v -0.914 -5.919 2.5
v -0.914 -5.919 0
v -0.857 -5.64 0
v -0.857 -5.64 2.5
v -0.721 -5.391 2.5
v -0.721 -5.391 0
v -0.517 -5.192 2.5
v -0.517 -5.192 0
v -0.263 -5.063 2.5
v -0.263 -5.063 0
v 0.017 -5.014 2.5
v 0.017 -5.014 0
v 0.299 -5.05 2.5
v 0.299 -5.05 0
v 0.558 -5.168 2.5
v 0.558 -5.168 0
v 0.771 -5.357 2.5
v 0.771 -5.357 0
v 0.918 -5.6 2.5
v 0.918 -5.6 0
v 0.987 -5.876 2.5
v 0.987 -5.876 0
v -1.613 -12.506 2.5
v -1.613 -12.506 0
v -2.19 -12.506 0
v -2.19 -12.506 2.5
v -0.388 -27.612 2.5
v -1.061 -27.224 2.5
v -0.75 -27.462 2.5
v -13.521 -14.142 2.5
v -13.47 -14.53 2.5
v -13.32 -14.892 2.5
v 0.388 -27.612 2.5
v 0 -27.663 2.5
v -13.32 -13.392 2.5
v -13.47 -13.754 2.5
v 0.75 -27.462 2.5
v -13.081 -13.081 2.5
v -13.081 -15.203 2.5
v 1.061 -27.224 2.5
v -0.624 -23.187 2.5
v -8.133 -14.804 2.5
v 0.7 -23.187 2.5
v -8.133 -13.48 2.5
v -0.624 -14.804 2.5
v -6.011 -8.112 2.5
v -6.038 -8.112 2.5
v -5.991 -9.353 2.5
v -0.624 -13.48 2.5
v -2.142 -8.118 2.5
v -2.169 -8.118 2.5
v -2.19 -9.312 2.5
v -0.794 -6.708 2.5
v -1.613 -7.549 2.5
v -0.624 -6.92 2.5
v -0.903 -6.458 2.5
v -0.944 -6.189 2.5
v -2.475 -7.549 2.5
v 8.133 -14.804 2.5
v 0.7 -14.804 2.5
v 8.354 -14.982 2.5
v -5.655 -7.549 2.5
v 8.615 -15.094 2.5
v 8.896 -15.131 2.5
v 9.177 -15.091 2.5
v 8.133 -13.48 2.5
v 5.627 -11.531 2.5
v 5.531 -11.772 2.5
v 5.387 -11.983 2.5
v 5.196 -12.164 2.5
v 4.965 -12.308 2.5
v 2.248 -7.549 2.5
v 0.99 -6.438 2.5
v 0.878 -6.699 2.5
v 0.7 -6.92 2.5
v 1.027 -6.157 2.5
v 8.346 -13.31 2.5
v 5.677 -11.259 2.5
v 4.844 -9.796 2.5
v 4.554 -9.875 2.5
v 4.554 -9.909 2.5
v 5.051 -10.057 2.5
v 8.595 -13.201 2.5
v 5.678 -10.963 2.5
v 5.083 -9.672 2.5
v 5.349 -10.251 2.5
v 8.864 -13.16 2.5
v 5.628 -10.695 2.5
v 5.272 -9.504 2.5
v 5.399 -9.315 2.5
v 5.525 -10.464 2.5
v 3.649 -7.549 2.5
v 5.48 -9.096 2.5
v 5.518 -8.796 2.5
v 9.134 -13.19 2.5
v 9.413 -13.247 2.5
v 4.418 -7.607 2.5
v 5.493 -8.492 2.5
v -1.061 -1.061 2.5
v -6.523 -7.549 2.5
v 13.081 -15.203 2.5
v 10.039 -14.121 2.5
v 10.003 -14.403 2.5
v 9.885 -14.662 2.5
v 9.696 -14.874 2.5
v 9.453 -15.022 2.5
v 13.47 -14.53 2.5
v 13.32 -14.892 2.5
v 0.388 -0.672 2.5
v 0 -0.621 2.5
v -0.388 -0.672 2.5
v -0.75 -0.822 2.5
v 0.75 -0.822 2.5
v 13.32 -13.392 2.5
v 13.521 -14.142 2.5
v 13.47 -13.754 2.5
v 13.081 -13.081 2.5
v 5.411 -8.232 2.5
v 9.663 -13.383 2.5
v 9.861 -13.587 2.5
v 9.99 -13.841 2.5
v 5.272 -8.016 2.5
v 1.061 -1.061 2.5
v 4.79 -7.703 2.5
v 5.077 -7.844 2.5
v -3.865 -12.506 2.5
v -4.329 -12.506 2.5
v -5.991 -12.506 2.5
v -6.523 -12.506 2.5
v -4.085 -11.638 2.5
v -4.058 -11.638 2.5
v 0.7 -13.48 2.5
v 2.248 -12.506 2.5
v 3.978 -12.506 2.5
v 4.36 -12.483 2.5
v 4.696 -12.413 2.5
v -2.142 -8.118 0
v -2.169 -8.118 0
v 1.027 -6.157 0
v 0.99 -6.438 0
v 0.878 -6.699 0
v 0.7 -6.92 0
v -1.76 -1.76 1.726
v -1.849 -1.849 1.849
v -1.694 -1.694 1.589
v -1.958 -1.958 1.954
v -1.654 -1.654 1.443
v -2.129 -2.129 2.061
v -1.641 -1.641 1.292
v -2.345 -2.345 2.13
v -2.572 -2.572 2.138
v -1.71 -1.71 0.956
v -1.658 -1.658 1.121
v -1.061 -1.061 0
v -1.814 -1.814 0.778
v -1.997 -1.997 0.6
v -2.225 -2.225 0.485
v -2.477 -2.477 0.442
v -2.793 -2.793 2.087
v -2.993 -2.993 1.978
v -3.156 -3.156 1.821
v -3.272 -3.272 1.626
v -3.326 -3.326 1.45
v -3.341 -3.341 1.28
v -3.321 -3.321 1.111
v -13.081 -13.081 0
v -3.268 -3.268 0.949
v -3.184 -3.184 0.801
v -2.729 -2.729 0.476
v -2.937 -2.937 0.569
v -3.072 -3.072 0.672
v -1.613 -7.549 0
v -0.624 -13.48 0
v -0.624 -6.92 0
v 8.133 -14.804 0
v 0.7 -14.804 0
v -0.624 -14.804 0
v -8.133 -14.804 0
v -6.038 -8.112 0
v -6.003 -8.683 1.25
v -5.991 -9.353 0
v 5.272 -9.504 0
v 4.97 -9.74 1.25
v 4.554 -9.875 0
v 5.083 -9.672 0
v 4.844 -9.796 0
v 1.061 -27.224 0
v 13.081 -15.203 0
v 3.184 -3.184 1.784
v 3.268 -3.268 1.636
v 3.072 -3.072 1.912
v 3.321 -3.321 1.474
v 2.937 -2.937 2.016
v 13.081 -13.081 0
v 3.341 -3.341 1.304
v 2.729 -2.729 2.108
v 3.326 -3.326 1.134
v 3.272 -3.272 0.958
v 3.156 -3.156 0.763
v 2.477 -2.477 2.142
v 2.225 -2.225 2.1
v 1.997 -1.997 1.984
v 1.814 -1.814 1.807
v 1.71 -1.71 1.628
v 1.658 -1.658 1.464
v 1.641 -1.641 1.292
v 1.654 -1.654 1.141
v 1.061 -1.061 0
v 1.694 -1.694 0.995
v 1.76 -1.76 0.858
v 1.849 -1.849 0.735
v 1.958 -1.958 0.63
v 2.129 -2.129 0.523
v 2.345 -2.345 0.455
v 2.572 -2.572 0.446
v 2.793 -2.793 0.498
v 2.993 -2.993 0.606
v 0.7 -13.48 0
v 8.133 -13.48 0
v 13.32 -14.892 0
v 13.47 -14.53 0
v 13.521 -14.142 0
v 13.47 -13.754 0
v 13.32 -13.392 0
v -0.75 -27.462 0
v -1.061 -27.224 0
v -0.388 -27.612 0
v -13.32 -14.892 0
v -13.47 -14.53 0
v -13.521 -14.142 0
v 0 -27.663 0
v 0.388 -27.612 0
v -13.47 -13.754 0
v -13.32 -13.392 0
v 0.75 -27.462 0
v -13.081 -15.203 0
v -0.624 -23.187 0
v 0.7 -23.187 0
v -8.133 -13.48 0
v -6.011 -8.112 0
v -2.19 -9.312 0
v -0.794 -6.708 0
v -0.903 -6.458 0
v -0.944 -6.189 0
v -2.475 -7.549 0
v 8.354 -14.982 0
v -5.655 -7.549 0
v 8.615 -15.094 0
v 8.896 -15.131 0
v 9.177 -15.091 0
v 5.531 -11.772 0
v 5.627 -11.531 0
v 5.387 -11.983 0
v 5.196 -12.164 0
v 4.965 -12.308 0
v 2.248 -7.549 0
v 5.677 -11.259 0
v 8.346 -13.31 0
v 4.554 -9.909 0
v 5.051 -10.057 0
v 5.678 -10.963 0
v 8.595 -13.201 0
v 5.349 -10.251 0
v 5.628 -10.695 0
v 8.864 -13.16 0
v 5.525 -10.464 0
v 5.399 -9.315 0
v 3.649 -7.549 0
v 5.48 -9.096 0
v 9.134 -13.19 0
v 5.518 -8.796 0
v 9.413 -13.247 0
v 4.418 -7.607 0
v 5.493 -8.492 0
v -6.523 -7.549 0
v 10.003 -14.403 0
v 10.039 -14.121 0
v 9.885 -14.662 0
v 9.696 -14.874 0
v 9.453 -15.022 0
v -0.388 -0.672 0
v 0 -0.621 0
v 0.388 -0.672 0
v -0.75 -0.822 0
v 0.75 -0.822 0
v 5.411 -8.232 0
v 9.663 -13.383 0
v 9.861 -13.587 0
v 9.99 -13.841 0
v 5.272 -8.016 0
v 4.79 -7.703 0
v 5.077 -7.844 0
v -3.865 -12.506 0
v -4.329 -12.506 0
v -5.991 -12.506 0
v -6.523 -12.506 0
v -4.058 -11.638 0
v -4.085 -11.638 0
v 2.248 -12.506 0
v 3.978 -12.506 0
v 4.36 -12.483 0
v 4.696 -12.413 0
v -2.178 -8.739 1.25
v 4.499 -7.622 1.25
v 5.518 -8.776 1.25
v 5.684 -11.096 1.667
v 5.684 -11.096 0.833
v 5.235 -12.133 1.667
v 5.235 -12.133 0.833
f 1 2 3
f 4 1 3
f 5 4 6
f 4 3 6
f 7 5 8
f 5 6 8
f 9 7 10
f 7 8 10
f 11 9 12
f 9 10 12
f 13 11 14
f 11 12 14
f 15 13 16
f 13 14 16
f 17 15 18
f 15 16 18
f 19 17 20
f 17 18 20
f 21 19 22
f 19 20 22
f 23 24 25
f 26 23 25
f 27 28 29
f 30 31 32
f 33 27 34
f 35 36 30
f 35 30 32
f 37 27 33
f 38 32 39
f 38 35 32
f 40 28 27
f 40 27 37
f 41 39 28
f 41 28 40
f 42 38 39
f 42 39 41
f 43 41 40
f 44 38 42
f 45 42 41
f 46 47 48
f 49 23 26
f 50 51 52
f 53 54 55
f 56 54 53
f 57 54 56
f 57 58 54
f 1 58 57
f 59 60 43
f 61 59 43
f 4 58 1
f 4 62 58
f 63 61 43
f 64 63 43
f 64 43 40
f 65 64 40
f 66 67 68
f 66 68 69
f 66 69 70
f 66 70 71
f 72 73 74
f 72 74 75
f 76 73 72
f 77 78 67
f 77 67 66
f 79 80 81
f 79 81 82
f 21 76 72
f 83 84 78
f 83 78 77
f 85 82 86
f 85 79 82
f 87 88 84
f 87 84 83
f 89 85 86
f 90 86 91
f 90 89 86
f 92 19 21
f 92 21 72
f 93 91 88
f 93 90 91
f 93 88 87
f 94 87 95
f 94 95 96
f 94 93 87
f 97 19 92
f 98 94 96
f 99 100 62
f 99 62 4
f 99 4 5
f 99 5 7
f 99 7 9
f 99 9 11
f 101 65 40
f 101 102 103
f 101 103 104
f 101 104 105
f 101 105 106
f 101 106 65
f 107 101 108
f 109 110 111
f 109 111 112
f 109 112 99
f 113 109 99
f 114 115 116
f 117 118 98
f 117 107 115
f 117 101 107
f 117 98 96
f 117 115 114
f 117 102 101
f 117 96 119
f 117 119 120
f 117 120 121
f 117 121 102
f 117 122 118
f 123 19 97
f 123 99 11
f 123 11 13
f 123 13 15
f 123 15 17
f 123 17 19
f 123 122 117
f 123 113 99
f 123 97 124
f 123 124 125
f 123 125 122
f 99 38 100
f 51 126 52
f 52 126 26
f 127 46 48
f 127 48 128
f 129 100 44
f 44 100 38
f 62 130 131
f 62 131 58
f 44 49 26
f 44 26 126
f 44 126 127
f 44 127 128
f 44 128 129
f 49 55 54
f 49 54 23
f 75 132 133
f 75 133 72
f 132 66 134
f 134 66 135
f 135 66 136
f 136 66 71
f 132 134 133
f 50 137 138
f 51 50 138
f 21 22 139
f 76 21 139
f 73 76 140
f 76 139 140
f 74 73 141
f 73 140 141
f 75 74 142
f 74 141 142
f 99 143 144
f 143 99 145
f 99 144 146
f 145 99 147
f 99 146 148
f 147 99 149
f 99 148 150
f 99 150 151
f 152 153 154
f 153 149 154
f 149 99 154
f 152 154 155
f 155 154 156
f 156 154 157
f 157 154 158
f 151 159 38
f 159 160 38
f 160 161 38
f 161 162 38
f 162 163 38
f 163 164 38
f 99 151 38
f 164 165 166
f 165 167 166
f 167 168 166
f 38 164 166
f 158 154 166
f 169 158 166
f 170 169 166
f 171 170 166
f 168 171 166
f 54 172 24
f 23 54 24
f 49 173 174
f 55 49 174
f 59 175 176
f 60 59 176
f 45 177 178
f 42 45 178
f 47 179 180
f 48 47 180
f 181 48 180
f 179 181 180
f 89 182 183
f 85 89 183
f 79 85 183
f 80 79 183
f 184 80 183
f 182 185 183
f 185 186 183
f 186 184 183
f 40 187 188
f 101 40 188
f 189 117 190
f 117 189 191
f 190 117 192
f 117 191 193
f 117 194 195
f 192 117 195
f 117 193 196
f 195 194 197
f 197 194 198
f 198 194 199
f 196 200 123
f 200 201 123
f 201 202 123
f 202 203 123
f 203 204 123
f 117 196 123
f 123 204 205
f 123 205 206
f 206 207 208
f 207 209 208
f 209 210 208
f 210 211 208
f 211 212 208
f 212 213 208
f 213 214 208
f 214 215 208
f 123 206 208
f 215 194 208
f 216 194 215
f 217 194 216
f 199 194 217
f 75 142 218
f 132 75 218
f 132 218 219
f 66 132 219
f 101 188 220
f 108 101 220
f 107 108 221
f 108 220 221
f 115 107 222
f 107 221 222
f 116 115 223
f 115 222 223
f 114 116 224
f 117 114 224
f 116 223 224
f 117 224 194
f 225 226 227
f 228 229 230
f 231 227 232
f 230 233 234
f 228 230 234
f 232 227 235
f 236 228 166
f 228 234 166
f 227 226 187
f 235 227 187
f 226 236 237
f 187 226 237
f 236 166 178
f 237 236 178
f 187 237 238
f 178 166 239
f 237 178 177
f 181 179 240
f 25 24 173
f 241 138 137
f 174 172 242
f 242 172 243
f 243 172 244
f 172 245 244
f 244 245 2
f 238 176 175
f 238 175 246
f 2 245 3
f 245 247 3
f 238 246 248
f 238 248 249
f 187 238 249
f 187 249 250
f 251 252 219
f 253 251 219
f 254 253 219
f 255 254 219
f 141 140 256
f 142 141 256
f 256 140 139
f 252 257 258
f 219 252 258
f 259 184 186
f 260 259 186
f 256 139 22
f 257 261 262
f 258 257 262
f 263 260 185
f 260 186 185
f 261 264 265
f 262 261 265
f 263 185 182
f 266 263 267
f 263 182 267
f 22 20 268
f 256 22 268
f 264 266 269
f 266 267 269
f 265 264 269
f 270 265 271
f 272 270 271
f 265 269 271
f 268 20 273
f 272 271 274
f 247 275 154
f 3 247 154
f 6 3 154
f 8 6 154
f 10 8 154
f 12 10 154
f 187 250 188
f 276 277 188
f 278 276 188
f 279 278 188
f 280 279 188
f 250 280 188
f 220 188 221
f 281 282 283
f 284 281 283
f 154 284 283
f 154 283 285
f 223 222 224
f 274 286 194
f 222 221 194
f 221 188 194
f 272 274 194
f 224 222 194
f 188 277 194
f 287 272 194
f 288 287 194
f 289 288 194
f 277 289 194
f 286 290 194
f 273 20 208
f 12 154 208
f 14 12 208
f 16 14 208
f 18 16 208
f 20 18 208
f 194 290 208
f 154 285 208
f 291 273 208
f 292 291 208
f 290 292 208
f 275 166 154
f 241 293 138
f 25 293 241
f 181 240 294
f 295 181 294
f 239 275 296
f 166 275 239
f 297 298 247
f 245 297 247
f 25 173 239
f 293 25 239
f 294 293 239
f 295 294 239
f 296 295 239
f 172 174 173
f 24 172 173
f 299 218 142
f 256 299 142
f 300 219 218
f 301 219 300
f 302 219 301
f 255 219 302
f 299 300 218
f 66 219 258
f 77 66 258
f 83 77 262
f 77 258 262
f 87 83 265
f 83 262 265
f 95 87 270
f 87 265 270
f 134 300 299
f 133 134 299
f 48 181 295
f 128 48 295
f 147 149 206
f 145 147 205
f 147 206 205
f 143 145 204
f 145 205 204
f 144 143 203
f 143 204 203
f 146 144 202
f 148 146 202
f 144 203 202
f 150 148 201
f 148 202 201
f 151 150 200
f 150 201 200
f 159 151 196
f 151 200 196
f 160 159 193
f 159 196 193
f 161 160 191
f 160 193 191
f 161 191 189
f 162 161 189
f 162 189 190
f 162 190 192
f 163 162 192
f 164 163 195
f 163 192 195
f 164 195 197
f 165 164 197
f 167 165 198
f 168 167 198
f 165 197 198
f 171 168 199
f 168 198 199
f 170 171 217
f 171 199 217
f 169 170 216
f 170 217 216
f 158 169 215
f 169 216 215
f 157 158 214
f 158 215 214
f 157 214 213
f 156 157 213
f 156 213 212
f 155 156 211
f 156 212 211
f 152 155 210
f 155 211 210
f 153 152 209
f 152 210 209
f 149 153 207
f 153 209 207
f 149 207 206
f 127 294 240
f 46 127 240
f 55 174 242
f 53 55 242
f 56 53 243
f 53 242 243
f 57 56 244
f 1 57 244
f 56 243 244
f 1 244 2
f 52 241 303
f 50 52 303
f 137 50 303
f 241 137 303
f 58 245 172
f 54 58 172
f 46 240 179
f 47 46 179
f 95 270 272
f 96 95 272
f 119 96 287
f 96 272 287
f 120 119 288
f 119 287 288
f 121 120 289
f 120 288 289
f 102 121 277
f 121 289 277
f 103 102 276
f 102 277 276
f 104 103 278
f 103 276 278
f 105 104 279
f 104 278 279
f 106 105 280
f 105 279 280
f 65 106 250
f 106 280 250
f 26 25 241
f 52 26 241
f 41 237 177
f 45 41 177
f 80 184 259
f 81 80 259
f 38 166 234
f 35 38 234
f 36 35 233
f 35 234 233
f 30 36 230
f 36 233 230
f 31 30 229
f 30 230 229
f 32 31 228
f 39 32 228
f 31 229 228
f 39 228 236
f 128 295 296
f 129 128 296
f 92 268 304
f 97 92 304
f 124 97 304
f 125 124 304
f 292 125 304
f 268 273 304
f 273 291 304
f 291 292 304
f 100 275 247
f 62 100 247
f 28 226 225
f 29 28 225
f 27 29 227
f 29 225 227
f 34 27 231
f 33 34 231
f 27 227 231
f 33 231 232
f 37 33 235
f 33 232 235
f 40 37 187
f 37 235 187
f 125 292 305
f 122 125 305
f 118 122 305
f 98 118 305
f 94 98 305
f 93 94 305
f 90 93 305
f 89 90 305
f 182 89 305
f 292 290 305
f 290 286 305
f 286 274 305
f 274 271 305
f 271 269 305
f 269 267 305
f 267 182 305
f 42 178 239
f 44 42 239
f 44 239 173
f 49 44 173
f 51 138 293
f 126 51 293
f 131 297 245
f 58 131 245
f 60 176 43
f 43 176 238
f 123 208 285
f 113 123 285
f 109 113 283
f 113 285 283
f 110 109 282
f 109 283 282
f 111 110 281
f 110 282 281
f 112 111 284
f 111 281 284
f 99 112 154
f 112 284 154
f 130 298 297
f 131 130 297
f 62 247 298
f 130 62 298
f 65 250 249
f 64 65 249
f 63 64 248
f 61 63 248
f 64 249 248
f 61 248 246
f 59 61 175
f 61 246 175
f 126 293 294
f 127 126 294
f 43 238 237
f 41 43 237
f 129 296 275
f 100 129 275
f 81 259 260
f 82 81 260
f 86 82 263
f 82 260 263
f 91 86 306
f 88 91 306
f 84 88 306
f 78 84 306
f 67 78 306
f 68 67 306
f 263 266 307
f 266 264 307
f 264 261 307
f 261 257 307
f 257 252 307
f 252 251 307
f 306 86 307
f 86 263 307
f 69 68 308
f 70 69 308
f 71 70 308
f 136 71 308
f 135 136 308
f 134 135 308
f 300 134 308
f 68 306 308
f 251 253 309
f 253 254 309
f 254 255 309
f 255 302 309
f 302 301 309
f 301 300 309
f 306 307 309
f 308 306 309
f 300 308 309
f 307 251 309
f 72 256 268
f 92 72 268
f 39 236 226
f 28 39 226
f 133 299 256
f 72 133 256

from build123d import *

# Parameters (mm, degrees)
F1_DEPTH = 2.5
F2_R     = 0.85
F3_DEPTH = 12.5


with BuildPart() as f1:
    # F0 (on Top) → F1 (new body)
    with BuildSketch(Plane.XY):
        with BuildLine():
            Line((13.081475452, -13.081475452), (1.0606601718, -1.0606601718))
            ThreePointArc((1.0606601718, -1.0606601718), (0, -0.6213203436), (-1.0606601718, -1.0606601718))
            Line((-1.0606601718, -1.0606601718), (-13.081475452, -13.081475452))
            ThreePointArc((-13.081475452, -13.081475452), (-13.5208152802, -14.1421356237), (-13.081475452, -15.2027957955))
            Line((-13.081475452, -15.2027957955), (-1.0606601718, -27.2236110757))
            ThreePointArc((-1.0606601718, -27.2236110757), (0, -27.6629509039), (1.0606601718, -27.2236110757))
            Line((1.0606601718, -27.2236110757), (13.081475452, -15.2027957955))
            ThreePointArc((13.081475452, -15.2027957955), (13.5208152802, -14.1421356237), (13.081475452, -13.081475452))
        make_face()
        with BuildLine():
            Line((-3.8649892248, -12.5063058175), (-4.329398947, -12.5063058175))
            Line((-4.329398947, -12.5063058175), (-6.0112565859, -8.1117745675))
            Line((-6.0112565859, -8.1117745675), (-6.038383322, -8.1117745675))
            add(Edge.make_bspline(
                [(-6.038383322, -8.1117745675), (-5.9906402665, -8.6336929703), (-5.9906402665, -9.353094012)],
                knots=[0, 0, 0, 1, 1, 1], degree=2))
            Line((-5.9906402665, -9.353094012), (-5.9906402665, -12.5063058175))
            Line((-5.9906402665, -12.5063058175), (-6.5234093637, -12.5063058175))
            Line((-6.5234093637, -12.5063058175), (-6.5234093637, -7.5486235258))
            Line((-6.5234093637, -7.5486235258), (-5.6553538082, -7.5486235258))
            Line((-5.6553538082, -7.5486235258), (-4.085258322, -11.638250262))
            Line((-4.085258322, -11.638250262), (-4.0581315859, -11.638250262))
            Line((-4.0581315859, -11.638250262), (-2.4750152665, -7.5486235258))
            Line((-2.4750152665, -7.5486235258), (-1.6134701276, -7.5486235258))
            Line((-1.6134701276, -7.5486235258), (-1.6134701276, -12.5063058175))
            Line((-1.6134701276, -12.5063058175), (-2.1896420026, -12.5063058175))
            Line((-2.1896420026, -12.5063058175), (-2.1896420026, -9.3118613731))
            add(Edge.make_bspline(
                [(-2.1896420026, -9.3118613731), (-2.1896420026, -8.7628162342), (-2.141898947, -8.1182849842)],
                knots=[0, 0, 0, 1, 1, 1], degree=2))
            Line((-2.141898947, -8.1182849842), (-2.1690256832, -8.1182849842))
            Line((-2.1690256832, -8.1182849842), (-3.8649892248, -12.5063058175))
        make_face(mode=Mode.SUBTRACT)
        with BuildLine():
            Line((-8.1334756687, -14.8039748892), (-8.1334756687, -13.4802963582))
            Line((-8.1334756687, -13.4802963582), (-0.6236797201, -13.4802963582))
            Line((-0.6236797201, -13.4802963582), (-0.6236797201, -6.9198086858))
            ThreePointArc((-0.6236797201, -6.9198086858), (-0.9032194318, -6.4583786209), (-0.9135835525, -5.9189782686))
            ThreePointArc((-0.9135835525, -5.9189782686), (0.0168397474, -5.0141534426), (0.9868078824, -5.876451129))
            ThreePointArc((0.9868078824, -5.876451129), (0.9900106564, -6.4384308628), (0.6999988109, -6.9198086858))
            Line((0.6999988109, -6.9198086858), (0.6999988109, -13.4802963582))
            Line((0.6999988109, -13.4802963582), (8.1334756687, -13.4802963582))
            ThreePointArc((8.1334756687, -13.4802963582), (8.5949057336, -13.2007566465), (9.134306086, -13.1903925258))
            ThreePointArc((9.134306086, -13.1903925258), (10.0391309119, -14.1208158258), (9.1768332255, -15.0907839607))
            ThreePointArc((9.1768332255, -15.0907839607), (8.6148534917, -15.0939867347), (8.1334756687, -14.8039748892))
            Line((8.1334756687, -14.8039748892), (0.6999988109, -14.8039748892))
            Line((0.6999988109, -14.8039748892), (0.6999988109, -23.1867600232))
            Line((0.6999988109, -23.1867600232), (-0.6236797201, -23.1867600232))
            Line((-0.6236797201, -23.1867600232), (-0.6236797201, -14.8039748892))
            Line((-0.6236797201, -14.8039748892), (-8.1334756687, -14.8039748892))
        make_face(mode=Mode.SUBTRACT)
        with BuildLine():
            Line((2.2484090003, -12.5063053519), (2.2484090003, -7.5486230602))
            Line((2.2484090003, -7.5486230602), (3.6492336531, -7.5486230602))
            add(Edge.make_bspline(
                [(3.6492336531, -7.5486230602), (4.6355617781, -7.5486230602), (5.0766425073, -7.8437619491)],
                knots=[0, 0, 0, 1, 1, 1], degree=2))
            add(Edge.make_bspline(
                [(5.0766425073, -7.8437619491), (5.5177232364, -8.138900838), (5.5177232364, -8.7758366019)],
                knots=[0, 0, 0, 1, 1, 1], degree=2))
            add(Edge.make_bspline(
                [(5.5177232364, -8.7758366019), (5.5177232364, -9.2174598657), (5.2719550073, -9.5039181991)],
                knots=[0, 0, 0, 1, 1, 1], degree=2))
            add(Edge.make_bspline(
                [(5.2719550073, -9.5039181991), (5.0261867781, -9.7903765324), (4.5541815698, -9.8750119491)],
                knots=[0, 0, 0, 1, 1, 1], degree=2))
            Line((4.5541815698, -9.8750119491), (4.5541815698, -9.9086491019))
            add(Edge.make_bspline(
                [(4.5541815698, -9.9086491019), (5.6837388614, -10.101791463), (5.6837388614, -11.0957150741)],
                knots=[0, 0, 0, 1, 1, 1], degree=2))
            add(Edge.make_bspline(
                [(5.6837388614, -11.0957150741), (5.6837388614, -11.7597775741), (5.2345201114, -12.133041463)],
                knots=[0, 0, 0, 1, 1, 1], degree=2))
            add(Edge.make_bspline(
                [(5.2345201114, -12.133041463), (4.7853013614, -12.5063053519), (3.9780096948, -12.5063053519)],
                knots=[0, 0, 0, 1, 1, 1], degree=2))
            Line((3.9780096948, -12.5063053519), (2.2484090003, -12.5063053519))
        make_face(mode=Mode.SUBTRACT)
    extrude(amount=F1_DEPTH)

    # F2 (on Right) → F3 (cut, symmetric)
    with BuildSketch(Plane.YZ):
        with Locations((-2.4908210296, 1.292226194)):
            Circle(F2_R)
    extrude(amount=F3_DEPTH, both=True, mode=Mode.SUBTRACT)


solid = f1.part
